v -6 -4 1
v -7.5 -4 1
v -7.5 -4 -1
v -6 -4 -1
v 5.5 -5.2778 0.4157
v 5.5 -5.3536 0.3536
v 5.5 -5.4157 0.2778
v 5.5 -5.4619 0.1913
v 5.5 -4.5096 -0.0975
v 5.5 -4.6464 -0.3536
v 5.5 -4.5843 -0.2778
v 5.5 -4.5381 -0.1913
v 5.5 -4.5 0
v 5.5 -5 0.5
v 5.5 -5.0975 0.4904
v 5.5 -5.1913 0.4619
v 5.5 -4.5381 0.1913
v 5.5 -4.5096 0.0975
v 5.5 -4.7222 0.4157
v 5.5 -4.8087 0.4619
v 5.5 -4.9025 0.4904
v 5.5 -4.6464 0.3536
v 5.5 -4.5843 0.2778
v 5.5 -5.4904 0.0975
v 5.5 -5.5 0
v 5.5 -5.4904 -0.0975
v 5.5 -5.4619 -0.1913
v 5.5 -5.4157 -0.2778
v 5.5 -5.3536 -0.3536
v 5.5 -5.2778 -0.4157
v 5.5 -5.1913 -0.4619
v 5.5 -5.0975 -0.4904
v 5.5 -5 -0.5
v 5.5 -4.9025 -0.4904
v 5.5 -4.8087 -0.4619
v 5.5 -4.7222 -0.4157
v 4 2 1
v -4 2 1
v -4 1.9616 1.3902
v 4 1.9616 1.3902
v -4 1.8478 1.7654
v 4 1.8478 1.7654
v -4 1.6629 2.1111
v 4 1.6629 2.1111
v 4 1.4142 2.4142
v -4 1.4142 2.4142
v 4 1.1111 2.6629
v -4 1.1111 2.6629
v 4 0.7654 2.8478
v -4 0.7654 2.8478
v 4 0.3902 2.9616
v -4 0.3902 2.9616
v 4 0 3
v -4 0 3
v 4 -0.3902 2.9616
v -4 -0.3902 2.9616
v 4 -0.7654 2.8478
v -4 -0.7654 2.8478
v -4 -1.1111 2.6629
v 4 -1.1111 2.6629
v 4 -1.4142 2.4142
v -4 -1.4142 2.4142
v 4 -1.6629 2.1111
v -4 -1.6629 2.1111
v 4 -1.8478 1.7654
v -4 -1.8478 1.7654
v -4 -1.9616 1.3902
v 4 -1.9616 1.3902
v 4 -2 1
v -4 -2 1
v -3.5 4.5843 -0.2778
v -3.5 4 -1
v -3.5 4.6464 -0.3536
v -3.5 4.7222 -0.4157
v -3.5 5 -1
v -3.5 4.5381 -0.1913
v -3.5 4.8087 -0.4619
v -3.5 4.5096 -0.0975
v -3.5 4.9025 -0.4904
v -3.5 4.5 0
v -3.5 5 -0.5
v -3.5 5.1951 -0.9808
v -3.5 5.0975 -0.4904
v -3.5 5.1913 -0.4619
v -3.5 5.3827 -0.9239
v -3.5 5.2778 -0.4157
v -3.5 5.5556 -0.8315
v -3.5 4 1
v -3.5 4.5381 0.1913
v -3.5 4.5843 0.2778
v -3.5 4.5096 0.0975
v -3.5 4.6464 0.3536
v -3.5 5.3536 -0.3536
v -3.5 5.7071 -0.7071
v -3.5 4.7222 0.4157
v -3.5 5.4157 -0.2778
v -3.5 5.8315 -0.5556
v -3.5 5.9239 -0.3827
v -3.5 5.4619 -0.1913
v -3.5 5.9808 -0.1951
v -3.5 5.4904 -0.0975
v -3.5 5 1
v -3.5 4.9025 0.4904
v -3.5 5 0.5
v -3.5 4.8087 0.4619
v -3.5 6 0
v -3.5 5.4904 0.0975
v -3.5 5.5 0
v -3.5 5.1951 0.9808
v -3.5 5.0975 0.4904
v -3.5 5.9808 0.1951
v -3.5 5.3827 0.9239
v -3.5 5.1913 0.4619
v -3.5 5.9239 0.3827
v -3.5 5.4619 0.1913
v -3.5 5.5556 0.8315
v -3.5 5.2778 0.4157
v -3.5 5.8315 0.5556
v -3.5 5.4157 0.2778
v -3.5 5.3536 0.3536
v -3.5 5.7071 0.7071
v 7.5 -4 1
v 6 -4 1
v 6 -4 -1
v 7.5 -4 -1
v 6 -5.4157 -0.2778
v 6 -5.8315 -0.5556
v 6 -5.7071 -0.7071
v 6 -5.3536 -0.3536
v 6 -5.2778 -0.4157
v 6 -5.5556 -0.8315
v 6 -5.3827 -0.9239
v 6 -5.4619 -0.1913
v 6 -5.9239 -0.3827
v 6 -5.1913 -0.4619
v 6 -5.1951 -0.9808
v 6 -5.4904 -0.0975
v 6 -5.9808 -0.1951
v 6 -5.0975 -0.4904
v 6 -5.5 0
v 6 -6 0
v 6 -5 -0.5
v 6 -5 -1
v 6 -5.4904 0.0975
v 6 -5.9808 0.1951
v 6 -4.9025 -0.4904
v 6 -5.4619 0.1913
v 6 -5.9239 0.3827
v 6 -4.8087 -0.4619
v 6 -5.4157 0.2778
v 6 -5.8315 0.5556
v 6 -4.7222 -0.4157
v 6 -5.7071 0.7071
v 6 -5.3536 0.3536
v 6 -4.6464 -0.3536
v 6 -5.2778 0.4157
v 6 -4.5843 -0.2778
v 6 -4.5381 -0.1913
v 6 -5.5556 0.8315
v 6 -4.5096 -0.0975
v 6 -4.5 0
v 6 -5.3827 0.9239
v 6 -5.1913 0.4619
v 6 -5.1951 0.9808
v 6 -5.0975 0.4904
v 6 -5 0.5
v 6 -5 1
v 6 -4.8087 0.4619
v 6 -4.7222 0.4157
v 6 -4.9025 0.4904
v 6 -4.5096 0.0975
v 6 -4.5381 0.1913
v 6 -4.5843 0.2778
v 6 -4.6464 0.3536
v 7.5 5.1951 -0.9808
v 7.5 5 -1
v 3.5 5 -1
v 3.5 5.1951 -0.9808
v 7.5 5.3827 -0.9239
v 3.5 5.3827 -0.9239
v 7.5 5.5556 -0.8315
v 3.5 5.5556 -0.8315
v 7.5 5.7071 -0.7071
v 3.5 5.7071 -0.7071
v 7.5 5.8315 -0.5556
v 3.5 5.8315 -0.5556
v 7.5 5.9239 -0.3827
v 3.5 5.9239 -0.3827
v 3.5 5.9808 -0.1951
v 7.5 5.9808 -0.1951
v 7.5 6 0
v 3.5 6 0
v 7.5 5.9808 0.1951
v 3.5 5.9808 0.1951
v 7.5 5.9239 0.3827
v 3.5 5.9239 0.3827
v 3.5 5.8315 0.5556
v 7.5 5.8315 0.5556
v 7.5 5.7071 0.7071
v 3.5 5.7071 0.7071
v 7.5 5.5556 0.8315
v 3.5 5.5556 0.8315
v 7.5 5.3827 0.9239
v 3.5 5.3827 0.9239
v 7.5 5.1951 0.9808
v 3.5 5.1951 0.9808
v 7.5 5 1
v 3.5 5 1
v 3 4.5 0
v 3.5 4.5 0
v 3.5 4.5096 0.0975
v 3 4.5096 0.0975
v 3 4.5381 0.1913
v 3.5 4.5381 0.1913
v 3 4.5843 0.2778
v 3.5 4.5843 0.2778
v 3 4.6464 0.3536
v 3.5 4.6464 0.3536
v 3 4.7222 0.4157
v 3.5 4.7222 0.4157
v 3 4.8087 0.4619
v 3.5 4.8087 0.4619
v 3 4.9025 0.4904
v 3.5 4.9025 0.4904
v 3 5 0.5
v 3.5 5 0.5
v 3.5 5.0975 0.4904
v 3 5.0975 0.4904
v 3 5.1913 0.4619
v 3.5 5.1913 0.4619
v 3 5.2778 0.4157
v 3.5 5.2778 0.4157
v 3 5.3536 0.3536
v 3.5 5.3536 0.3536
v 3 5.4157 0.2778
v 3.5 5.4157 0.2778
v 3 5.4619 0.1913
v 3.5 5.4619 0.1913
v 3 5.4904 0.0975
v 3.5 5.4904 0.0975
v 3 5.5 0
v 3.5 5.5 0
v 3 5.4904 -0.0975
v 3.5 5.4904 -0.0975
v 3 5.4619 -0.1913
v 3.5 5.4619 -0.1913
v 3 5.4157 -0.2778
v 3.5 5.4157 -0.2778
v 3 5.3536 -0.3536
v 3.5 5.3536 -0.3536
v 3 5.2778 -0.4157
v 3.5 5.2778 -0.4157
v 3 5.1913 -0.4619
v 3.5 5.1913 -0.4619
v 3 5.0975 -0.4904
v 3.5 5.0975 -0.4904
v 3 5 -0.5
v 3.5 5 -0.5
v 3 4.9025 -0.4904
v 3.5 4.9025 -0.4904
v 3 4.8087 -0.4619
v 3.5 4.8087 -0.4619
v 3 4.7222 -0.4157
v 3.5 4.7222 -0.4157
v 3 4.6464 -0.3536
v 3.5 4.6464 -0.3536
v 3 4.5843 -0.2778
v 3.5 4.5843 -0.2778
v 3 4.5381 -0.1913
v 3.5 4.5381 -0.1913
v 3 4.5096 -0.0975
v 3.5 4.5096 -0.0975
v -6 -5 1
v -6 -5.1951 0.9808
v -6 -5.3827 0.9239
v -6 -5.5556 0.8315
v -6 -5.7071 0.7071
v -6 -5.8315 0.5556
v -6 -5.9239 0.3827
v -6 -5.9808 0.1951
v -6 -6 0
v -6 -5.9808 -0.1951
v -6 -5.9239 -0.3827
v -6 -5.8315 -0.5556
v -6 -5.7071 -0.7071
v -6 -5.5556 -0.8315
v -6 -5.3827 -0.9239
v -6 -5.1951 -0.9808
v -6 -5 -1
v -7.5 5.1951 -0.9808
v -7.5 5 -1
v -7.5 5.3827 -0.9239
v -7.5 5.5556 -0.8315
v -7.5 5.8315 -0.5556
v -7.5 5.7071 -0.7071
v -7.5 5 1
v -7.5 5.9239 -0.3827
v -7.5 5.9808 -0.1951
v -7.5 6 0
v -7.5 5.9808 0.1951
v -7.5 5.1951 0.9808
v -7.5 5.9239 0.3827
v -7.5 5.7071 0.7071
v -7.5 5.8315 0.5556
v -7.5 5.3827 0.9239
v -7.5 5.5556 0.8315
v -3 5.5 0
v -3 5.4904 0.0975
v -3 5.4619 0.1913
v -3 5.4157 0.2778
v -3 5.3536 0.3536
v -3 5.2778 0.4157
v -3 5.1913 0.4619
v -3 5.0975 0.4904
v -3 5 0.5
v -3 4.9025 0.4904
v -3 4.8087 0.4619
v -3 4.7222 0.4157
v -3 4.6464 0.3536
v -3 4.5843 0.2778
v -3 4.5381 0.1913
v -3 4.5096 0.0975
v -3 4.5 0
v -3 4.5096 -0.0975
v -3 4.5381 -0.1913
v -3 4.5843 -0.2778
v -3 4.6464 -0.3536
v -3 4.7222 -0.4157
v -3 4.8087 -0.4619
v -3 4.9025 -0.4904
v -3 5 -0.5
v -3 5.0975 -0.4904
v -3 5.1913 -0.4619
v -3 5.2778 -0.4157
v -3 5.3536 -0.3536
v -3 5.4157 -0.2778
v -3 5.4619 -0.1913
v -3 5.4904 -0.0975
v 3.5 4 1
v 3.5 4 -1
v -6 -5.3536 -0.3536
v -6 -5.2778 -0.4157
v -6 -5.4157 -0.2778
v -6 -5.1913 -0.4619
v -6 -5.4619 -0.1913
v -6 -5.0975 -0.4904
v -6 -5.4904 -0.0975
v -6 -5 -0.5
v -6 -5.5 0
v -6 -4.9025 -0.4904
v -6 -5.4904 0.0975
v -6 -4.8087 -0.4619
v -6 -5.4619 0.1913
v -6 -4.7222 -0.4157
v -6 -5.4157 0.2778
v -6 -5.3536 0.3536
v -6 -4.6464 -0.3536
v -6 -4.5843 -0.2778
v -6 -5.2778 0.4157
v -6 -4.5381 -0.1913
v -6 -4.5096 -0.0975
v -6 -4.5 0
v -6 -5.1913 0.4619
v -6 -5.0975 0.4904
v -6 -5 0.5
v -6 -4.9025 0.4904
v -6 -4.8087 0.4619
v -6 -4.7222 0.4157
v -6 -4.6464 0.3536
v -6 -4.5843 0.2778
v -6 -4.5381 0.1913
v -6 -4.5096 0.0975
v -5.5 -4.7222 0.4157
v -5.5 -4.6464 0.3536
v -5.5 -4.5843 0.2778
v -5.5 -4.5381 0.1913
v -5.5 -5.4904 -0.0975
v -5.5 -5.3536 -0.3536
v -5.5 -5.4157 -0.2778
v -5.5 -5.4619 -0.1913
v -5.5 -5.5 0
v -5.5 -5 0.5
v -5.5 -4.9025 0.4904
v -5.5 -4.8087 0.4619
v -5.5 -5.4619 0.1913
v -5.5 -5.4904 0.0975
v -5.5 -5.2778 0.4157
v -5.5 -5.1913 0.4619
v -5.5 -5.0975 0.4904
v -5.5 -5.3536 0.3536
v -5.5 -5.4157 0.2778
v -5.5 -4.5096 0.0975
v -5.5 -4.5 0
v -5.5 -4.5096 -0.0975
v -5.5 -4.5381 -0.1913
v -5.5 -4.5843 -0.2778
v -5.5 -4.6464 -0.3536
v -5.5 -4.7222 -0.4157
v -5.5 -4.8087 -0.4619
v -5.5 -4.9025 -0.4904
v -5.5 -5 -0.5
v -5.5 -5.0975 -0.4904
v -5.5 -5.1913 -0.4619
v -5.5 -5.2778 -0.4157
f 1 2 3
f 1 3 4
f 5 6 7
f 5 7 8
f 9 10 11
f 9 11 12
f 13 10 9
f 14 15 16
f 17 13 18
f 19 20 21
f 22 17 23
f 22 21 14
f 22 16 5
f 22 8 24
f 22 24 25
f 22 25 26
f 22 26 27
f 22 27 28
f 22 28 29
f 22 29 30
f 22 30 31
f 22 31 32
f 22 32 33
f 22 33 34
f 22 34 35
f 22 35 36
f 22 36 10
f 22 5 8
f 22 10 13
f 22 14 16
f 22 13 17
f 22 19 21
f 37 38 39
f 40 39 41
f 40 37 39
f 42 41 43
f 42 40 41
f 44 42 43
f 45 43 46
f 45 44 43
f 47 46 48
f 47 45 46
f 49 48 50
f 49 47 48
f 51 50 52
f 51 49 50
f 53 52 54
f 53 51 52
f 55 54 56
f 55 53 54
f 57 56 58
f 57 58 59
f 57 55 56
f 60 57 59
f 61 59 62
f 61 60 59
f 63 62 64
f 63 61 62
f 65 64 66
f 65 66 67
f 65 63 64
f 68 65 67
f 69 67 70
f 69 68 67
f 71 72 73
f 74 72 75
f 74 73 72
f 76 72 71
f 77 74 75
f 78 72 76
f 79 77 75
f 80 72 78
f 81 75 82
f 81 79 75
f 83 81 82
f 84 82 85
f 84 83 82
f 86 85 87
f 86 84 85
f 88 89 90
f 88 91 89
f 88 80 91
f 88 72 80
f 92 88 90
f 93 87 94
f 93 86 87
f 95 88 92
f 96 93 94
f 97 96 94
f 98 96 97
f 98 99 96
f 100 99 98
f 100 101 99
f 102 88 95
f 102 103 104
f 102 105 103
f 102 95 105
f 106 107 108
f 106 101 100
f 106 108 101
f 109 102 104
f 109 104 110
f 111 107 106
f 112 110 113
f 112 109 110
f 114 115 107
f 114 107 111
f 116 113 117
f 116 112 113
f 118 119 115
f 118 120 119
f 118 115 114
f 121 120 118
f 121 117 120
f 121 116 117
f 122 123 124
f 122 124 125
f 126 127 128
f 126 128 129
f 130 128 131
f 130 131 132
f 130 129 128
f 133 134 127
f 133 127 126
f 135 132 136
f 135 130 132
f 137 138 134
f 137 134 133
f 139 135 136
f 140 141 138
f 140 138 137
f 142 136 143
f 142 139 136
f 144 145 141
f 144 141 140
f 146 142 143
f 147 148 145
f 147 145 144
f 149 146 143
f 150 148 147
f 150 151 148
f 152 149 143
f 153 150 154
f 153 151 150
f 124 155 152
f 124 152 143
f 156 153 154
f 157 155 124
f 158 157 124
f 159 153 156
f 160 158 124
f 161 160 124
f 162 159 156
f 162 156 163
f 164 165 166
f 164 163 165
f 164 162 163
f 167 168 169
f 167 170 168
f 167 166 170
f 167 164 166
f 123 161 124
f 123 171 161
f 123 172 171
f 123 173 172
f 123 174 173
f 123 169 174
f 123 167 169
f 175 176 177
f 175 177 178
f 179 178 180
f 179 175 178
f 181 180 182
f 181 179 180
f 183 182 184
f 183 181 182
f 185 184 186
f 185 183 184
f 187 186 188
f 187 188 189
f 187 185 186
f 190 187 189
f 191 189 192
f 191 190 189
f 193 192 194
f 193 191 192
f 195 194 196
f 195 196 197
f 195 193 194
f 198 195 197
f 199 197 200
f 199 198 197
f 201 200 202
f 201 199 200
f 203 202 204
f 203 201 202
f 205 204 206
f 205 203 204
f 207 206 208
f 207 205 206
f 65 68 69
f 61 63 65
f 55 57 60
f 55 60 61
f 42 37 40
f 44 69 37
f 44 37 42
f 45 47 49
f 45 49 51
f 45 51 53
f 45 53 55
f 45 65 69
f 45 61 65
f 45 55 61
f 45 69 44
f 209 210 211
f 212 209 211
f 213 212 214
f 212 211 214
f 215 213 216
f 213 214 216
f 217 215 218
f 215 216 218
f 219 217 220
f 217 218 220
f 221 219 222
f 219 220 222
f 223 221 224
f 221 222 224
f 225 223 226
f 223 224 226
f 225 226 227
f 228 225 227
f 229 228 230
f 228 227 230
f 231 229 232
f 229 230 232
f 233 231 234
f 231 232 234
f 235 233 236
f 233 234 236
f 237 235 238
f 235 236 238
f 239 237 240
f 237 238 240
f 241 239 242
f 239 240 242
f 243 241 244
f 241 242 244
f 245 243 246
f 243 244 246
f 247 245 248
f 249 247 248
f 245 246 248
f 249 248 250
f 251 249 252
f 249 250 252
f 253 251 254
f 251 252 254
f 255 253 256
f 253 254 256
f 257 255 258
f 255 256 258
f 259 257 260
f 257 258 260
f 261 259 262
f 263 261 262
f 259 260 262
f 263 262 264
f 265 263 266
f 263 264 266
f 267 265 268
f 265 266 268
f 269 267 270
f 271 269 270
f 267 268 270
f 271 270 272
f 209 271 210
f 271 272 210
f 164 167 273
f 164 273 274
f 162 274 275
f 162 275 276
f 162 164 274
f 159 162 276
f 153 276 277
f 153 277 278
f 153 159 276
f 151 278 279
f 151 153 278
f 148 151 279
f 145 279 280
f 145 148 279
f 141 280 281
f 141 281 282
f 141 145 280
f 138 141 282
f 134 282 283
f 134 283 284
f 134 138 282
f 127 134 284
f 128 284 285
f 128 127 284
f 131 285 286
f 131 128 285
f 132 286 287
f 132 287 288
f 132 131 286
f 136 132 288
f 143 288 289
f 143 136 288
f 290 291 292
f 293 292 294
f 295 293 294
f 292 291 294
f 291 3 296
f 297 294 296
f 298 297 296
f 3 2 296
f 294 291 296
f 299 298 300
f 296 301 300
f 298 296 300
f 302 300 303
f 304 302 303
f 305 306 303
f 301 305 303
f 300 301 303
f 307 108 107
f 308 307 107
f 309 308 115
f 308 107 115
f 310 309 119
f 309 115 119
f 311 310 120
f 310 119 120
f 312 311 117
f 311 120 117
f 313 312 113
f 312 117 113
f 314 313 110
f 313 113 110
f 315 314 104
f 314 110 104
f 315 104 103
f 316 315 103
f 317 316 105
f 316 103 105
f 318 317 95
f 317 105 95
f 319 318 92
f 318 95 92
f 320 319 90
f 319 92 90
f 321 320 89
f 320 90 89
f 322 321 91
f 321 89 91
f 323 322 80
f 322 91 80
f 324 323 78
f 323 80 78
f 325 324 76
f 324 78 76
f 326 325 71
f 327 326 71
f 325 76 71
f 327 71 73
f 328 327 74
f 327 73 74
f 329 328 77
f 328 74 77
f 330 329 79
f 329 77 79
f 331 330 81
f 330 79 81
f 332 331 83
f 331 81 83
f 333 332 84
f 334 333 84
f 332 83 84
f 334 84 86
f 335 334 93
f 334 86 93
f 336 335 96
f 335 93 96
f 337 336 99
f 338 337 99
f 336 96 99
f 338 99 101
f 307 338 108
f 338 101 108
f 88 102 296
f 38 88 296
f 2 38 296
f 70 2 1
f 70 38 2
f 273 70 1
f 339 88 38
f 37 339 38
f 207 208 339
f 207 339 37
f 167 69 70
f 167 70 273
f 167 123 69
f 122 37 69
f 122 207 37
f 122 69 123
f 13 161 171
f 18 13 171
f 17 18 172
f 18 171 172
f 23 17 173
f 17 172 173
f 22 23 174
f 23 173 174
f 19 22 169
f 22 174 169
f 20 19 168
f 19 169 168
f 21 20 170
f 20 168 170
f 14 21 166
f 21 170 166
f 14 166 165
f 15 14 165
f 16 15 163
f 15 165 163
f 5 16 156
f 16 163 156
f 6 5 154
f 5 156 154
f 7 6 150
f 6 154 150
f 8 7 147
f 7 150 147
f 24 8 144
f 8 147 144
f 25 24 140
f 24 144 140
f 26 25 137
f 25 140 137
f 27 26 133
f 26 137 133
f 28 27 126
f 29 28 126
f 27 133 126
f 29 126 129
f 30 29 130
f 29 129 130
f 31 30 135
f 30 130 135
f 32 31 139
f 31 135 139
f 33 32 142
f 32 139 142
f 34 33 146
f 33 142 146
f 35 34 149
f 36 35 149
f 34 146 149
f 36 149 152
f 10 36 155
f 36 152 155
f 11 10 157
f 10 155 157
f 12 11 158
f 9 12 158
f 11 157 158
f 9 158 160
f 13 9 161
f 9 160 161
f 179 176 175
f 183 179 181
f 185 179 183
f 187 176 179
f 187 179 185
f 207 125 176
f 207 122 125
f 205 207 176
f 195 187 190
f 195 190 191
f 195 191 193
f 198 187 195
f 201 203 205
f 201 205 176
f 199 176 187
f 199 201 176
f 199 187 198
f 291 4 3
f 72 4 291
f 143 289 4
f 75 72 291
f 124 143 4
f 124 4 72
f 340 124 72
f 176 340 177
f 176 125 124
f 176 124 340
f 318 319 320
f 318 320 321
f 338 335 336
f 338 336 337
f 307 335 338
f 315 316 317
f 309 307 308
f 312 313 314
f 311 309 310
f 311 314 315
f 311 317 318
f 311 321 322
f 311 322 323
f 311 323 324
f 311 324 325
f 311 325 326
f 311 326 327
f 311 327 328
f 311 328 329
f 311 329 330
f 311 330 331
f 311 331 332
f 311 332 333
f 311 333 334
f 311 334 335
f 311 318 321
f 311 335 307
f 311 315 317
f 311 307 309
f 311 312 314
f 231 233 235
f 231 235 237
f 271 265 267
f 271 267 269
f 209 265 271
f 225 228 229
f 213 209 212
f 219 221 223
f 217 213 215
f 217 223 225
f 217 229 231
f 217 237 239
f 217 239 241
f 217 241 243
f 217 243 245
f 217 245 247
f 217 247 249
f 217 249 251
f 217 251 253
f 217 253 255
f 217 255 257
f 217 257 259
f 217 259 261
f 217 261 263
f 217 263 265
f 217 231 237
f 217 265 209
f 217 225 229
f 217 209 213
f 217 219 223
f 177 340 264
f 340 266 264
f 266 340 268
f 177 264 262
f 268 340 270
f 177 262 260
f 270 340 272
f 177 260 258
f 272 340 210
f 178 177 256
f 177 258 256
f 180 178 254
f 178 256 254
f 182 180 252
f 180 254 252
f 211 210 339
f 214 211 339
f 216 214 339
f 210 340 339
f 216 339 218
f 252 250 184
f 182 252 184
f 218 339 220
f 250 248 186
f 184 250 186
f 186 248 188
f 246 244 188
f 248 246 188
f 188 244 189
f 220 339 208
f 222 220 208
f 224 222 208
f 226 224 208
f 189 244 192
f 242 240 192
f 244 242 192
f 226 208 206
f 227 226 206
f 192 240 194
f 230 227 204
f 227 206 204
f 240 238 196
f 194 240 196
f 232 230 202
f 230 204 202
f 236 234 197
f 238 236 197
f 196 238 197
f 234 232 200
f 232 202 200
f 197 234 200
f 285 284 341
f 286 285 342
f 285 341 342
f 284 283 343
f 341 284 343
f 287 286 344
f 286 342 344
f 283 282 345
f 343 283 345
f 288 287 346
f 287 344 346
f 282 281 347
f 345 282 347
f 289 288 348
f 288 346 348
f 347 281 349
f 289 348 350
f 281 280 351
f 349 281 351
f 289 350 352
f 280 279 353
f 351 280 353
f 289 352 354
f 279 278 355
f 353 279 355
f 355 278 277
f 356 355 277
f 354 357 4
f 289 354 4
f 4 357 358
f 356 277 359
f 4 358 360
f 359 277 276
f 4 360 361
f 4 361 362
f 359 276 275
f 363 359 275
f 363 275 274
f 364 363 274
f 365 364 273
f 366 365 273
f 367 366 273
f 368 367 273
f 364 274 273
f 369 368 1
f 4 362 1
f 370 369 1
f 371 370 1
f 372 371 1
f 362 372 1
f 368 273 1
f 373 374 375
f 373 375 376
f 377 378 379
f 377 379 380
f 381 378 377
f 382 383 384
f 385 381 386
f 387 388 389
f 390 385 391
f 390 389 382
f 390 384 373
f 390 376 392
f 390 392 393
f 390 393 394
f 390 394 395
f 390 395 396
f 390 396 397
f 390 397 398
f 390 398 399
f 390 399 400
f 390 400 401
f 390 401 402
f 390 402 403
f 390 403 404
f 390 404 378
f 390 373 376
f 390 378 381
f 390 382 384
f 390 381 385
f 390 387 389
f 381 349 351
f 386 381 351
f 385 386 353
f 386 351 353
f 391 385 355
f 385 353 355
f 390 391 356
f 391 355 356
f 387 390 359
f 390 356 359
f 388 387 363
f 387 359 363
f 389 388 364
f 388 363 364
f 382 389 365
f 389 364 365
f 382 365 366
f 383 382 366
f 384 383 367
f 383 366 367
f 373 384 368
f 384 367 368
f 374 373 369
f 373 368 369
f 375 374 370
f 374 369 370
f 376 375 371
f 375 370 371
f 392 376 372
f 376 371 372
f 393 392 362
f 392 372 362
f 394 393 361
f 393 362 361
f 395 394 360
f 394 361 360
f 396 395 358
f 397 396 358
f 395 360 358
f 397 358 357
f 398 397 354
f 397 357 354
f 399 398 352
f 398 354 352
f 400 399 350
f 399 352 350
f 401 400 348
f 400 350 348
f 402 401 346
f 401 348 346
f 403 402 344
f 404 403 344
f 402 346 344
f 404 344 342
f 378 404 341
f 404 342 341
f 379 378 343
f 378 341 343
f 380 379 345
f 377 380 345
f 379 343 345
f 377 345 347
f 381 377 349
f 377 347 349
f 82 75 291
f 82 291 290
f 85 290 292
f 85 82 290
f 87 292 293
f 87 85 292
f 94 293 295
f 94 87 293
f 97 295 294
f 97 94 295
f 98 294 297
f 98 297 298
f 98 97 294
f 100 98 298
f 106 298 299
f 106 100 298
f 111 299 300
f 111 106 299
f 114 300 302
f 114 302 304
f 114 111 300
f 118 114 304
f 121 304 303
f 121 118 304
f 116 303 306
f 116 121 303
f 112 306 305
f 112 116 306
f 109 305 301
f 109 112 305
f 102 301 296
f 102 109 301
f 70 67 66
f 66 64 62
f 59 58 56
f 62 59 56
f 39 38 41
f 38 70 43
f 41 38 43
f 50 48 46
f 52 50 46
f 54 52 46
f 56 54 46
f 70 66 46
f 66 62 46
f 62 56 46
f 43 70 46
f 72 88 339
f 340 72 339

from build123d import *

# Parameters (mm, degrees)
F1_DEPTH  = 7.5
F2_W      = 7
F2_H      = 2.1077826433
F2_W_2    = 1.5
F2_H_2    = 2.502781529
F2_H_3    = 3.0992894471
F3_DEPTH  = 5
F4_R      = 0.5
F5_DEPTH  = 0.5
F6_R      = 0.5
F7_DEPTH  = 0.5
F8_R      = 0.5
F9_DEPTH  = 0.5
F10_R     = 0.5
F11_DEPTH = 0.5
F13_DEPTH = 4


with BuildPart() as f1:
    # F0 (on Right) → F1 (new body, symmetric)
    with BuildSketch(Plane.YZ):
        with BuildLine():
            ThreePointArc((5, -1), (6, 0), (5, 1))
            Line((5, 1), (-5, 1))
            ThreePointArc((-5, 1), (-6, 0), (-5, -1))
            Line((-5, -1), (5, -1))
        make_face()
    extrude(amount=F1_DEPTH, both=True)

    # F2 (on face) → F3 (cut)
    with BuildSketch(Plane.XY.offset(1)):
        with Locations((0, 5.0538913216)):
            Rectangle(F2_W, F2_H)
        with Locations((-6.75, -5.2513907645)):
            Rectangle(F2_W_2, F2_H_2)
        with Locations((6.75, -5.5496447235)):
            Rectangle(F2_W_2, F2_H_3)
    extrude(amount=-F3_DEPTH, mode=Mode.SUBTRACT)

    # F4 (on face) → F5 (cut)
    with BuildSketch(Plane(origin=(-6, 0, 0), x_dir=(0, -1, 0), z_dir=(-1, 0, 0))):
        with Locations((5, 0)):
            Circle(F4_R)
    extrude(amount=-F5_DEPTH, mode=Mode.SUBTRACT)

    # F6 (on face) → F7 (cut)
    with BuildSketch(Plane.YZ.offset(6)):
        with Locations((-5, 0)):
            Circle(F6_R)
    extrude(amount=-F7_DEPTH, mode=Mode.SUBTRACT)

    # F8 (on face) → F9 (join)
    with BuildSketch(Plane.YZ.offset(-3.5)):
        with Locations((5, 0)):
            Circle(F8_R)
    extrude(amount=F9_DEPTH)

    # F10 (on face) → F11 (join)
    with BuildSketch(Plane(origin=(3.5, 0, 0), x_dir=(0, -1, 0), z_dir=(-1, 0, 0))):
        with Locations((-5, 0)):
            Circle(F10_R)
    extrude(amount=F11_DEPTH)

    # F12 (on Right) → F13 (join, symmetric)
    with BuildSketch(Plane.YZ):
        with BuildLine():
            Line((-2, 1), (2, 1))
            ThreePointArc((2, 1), (0, 3), (-2, 1))
        make_face()
    extrude(amount=F13_DEPTH, both=True)


solid = f1.part
